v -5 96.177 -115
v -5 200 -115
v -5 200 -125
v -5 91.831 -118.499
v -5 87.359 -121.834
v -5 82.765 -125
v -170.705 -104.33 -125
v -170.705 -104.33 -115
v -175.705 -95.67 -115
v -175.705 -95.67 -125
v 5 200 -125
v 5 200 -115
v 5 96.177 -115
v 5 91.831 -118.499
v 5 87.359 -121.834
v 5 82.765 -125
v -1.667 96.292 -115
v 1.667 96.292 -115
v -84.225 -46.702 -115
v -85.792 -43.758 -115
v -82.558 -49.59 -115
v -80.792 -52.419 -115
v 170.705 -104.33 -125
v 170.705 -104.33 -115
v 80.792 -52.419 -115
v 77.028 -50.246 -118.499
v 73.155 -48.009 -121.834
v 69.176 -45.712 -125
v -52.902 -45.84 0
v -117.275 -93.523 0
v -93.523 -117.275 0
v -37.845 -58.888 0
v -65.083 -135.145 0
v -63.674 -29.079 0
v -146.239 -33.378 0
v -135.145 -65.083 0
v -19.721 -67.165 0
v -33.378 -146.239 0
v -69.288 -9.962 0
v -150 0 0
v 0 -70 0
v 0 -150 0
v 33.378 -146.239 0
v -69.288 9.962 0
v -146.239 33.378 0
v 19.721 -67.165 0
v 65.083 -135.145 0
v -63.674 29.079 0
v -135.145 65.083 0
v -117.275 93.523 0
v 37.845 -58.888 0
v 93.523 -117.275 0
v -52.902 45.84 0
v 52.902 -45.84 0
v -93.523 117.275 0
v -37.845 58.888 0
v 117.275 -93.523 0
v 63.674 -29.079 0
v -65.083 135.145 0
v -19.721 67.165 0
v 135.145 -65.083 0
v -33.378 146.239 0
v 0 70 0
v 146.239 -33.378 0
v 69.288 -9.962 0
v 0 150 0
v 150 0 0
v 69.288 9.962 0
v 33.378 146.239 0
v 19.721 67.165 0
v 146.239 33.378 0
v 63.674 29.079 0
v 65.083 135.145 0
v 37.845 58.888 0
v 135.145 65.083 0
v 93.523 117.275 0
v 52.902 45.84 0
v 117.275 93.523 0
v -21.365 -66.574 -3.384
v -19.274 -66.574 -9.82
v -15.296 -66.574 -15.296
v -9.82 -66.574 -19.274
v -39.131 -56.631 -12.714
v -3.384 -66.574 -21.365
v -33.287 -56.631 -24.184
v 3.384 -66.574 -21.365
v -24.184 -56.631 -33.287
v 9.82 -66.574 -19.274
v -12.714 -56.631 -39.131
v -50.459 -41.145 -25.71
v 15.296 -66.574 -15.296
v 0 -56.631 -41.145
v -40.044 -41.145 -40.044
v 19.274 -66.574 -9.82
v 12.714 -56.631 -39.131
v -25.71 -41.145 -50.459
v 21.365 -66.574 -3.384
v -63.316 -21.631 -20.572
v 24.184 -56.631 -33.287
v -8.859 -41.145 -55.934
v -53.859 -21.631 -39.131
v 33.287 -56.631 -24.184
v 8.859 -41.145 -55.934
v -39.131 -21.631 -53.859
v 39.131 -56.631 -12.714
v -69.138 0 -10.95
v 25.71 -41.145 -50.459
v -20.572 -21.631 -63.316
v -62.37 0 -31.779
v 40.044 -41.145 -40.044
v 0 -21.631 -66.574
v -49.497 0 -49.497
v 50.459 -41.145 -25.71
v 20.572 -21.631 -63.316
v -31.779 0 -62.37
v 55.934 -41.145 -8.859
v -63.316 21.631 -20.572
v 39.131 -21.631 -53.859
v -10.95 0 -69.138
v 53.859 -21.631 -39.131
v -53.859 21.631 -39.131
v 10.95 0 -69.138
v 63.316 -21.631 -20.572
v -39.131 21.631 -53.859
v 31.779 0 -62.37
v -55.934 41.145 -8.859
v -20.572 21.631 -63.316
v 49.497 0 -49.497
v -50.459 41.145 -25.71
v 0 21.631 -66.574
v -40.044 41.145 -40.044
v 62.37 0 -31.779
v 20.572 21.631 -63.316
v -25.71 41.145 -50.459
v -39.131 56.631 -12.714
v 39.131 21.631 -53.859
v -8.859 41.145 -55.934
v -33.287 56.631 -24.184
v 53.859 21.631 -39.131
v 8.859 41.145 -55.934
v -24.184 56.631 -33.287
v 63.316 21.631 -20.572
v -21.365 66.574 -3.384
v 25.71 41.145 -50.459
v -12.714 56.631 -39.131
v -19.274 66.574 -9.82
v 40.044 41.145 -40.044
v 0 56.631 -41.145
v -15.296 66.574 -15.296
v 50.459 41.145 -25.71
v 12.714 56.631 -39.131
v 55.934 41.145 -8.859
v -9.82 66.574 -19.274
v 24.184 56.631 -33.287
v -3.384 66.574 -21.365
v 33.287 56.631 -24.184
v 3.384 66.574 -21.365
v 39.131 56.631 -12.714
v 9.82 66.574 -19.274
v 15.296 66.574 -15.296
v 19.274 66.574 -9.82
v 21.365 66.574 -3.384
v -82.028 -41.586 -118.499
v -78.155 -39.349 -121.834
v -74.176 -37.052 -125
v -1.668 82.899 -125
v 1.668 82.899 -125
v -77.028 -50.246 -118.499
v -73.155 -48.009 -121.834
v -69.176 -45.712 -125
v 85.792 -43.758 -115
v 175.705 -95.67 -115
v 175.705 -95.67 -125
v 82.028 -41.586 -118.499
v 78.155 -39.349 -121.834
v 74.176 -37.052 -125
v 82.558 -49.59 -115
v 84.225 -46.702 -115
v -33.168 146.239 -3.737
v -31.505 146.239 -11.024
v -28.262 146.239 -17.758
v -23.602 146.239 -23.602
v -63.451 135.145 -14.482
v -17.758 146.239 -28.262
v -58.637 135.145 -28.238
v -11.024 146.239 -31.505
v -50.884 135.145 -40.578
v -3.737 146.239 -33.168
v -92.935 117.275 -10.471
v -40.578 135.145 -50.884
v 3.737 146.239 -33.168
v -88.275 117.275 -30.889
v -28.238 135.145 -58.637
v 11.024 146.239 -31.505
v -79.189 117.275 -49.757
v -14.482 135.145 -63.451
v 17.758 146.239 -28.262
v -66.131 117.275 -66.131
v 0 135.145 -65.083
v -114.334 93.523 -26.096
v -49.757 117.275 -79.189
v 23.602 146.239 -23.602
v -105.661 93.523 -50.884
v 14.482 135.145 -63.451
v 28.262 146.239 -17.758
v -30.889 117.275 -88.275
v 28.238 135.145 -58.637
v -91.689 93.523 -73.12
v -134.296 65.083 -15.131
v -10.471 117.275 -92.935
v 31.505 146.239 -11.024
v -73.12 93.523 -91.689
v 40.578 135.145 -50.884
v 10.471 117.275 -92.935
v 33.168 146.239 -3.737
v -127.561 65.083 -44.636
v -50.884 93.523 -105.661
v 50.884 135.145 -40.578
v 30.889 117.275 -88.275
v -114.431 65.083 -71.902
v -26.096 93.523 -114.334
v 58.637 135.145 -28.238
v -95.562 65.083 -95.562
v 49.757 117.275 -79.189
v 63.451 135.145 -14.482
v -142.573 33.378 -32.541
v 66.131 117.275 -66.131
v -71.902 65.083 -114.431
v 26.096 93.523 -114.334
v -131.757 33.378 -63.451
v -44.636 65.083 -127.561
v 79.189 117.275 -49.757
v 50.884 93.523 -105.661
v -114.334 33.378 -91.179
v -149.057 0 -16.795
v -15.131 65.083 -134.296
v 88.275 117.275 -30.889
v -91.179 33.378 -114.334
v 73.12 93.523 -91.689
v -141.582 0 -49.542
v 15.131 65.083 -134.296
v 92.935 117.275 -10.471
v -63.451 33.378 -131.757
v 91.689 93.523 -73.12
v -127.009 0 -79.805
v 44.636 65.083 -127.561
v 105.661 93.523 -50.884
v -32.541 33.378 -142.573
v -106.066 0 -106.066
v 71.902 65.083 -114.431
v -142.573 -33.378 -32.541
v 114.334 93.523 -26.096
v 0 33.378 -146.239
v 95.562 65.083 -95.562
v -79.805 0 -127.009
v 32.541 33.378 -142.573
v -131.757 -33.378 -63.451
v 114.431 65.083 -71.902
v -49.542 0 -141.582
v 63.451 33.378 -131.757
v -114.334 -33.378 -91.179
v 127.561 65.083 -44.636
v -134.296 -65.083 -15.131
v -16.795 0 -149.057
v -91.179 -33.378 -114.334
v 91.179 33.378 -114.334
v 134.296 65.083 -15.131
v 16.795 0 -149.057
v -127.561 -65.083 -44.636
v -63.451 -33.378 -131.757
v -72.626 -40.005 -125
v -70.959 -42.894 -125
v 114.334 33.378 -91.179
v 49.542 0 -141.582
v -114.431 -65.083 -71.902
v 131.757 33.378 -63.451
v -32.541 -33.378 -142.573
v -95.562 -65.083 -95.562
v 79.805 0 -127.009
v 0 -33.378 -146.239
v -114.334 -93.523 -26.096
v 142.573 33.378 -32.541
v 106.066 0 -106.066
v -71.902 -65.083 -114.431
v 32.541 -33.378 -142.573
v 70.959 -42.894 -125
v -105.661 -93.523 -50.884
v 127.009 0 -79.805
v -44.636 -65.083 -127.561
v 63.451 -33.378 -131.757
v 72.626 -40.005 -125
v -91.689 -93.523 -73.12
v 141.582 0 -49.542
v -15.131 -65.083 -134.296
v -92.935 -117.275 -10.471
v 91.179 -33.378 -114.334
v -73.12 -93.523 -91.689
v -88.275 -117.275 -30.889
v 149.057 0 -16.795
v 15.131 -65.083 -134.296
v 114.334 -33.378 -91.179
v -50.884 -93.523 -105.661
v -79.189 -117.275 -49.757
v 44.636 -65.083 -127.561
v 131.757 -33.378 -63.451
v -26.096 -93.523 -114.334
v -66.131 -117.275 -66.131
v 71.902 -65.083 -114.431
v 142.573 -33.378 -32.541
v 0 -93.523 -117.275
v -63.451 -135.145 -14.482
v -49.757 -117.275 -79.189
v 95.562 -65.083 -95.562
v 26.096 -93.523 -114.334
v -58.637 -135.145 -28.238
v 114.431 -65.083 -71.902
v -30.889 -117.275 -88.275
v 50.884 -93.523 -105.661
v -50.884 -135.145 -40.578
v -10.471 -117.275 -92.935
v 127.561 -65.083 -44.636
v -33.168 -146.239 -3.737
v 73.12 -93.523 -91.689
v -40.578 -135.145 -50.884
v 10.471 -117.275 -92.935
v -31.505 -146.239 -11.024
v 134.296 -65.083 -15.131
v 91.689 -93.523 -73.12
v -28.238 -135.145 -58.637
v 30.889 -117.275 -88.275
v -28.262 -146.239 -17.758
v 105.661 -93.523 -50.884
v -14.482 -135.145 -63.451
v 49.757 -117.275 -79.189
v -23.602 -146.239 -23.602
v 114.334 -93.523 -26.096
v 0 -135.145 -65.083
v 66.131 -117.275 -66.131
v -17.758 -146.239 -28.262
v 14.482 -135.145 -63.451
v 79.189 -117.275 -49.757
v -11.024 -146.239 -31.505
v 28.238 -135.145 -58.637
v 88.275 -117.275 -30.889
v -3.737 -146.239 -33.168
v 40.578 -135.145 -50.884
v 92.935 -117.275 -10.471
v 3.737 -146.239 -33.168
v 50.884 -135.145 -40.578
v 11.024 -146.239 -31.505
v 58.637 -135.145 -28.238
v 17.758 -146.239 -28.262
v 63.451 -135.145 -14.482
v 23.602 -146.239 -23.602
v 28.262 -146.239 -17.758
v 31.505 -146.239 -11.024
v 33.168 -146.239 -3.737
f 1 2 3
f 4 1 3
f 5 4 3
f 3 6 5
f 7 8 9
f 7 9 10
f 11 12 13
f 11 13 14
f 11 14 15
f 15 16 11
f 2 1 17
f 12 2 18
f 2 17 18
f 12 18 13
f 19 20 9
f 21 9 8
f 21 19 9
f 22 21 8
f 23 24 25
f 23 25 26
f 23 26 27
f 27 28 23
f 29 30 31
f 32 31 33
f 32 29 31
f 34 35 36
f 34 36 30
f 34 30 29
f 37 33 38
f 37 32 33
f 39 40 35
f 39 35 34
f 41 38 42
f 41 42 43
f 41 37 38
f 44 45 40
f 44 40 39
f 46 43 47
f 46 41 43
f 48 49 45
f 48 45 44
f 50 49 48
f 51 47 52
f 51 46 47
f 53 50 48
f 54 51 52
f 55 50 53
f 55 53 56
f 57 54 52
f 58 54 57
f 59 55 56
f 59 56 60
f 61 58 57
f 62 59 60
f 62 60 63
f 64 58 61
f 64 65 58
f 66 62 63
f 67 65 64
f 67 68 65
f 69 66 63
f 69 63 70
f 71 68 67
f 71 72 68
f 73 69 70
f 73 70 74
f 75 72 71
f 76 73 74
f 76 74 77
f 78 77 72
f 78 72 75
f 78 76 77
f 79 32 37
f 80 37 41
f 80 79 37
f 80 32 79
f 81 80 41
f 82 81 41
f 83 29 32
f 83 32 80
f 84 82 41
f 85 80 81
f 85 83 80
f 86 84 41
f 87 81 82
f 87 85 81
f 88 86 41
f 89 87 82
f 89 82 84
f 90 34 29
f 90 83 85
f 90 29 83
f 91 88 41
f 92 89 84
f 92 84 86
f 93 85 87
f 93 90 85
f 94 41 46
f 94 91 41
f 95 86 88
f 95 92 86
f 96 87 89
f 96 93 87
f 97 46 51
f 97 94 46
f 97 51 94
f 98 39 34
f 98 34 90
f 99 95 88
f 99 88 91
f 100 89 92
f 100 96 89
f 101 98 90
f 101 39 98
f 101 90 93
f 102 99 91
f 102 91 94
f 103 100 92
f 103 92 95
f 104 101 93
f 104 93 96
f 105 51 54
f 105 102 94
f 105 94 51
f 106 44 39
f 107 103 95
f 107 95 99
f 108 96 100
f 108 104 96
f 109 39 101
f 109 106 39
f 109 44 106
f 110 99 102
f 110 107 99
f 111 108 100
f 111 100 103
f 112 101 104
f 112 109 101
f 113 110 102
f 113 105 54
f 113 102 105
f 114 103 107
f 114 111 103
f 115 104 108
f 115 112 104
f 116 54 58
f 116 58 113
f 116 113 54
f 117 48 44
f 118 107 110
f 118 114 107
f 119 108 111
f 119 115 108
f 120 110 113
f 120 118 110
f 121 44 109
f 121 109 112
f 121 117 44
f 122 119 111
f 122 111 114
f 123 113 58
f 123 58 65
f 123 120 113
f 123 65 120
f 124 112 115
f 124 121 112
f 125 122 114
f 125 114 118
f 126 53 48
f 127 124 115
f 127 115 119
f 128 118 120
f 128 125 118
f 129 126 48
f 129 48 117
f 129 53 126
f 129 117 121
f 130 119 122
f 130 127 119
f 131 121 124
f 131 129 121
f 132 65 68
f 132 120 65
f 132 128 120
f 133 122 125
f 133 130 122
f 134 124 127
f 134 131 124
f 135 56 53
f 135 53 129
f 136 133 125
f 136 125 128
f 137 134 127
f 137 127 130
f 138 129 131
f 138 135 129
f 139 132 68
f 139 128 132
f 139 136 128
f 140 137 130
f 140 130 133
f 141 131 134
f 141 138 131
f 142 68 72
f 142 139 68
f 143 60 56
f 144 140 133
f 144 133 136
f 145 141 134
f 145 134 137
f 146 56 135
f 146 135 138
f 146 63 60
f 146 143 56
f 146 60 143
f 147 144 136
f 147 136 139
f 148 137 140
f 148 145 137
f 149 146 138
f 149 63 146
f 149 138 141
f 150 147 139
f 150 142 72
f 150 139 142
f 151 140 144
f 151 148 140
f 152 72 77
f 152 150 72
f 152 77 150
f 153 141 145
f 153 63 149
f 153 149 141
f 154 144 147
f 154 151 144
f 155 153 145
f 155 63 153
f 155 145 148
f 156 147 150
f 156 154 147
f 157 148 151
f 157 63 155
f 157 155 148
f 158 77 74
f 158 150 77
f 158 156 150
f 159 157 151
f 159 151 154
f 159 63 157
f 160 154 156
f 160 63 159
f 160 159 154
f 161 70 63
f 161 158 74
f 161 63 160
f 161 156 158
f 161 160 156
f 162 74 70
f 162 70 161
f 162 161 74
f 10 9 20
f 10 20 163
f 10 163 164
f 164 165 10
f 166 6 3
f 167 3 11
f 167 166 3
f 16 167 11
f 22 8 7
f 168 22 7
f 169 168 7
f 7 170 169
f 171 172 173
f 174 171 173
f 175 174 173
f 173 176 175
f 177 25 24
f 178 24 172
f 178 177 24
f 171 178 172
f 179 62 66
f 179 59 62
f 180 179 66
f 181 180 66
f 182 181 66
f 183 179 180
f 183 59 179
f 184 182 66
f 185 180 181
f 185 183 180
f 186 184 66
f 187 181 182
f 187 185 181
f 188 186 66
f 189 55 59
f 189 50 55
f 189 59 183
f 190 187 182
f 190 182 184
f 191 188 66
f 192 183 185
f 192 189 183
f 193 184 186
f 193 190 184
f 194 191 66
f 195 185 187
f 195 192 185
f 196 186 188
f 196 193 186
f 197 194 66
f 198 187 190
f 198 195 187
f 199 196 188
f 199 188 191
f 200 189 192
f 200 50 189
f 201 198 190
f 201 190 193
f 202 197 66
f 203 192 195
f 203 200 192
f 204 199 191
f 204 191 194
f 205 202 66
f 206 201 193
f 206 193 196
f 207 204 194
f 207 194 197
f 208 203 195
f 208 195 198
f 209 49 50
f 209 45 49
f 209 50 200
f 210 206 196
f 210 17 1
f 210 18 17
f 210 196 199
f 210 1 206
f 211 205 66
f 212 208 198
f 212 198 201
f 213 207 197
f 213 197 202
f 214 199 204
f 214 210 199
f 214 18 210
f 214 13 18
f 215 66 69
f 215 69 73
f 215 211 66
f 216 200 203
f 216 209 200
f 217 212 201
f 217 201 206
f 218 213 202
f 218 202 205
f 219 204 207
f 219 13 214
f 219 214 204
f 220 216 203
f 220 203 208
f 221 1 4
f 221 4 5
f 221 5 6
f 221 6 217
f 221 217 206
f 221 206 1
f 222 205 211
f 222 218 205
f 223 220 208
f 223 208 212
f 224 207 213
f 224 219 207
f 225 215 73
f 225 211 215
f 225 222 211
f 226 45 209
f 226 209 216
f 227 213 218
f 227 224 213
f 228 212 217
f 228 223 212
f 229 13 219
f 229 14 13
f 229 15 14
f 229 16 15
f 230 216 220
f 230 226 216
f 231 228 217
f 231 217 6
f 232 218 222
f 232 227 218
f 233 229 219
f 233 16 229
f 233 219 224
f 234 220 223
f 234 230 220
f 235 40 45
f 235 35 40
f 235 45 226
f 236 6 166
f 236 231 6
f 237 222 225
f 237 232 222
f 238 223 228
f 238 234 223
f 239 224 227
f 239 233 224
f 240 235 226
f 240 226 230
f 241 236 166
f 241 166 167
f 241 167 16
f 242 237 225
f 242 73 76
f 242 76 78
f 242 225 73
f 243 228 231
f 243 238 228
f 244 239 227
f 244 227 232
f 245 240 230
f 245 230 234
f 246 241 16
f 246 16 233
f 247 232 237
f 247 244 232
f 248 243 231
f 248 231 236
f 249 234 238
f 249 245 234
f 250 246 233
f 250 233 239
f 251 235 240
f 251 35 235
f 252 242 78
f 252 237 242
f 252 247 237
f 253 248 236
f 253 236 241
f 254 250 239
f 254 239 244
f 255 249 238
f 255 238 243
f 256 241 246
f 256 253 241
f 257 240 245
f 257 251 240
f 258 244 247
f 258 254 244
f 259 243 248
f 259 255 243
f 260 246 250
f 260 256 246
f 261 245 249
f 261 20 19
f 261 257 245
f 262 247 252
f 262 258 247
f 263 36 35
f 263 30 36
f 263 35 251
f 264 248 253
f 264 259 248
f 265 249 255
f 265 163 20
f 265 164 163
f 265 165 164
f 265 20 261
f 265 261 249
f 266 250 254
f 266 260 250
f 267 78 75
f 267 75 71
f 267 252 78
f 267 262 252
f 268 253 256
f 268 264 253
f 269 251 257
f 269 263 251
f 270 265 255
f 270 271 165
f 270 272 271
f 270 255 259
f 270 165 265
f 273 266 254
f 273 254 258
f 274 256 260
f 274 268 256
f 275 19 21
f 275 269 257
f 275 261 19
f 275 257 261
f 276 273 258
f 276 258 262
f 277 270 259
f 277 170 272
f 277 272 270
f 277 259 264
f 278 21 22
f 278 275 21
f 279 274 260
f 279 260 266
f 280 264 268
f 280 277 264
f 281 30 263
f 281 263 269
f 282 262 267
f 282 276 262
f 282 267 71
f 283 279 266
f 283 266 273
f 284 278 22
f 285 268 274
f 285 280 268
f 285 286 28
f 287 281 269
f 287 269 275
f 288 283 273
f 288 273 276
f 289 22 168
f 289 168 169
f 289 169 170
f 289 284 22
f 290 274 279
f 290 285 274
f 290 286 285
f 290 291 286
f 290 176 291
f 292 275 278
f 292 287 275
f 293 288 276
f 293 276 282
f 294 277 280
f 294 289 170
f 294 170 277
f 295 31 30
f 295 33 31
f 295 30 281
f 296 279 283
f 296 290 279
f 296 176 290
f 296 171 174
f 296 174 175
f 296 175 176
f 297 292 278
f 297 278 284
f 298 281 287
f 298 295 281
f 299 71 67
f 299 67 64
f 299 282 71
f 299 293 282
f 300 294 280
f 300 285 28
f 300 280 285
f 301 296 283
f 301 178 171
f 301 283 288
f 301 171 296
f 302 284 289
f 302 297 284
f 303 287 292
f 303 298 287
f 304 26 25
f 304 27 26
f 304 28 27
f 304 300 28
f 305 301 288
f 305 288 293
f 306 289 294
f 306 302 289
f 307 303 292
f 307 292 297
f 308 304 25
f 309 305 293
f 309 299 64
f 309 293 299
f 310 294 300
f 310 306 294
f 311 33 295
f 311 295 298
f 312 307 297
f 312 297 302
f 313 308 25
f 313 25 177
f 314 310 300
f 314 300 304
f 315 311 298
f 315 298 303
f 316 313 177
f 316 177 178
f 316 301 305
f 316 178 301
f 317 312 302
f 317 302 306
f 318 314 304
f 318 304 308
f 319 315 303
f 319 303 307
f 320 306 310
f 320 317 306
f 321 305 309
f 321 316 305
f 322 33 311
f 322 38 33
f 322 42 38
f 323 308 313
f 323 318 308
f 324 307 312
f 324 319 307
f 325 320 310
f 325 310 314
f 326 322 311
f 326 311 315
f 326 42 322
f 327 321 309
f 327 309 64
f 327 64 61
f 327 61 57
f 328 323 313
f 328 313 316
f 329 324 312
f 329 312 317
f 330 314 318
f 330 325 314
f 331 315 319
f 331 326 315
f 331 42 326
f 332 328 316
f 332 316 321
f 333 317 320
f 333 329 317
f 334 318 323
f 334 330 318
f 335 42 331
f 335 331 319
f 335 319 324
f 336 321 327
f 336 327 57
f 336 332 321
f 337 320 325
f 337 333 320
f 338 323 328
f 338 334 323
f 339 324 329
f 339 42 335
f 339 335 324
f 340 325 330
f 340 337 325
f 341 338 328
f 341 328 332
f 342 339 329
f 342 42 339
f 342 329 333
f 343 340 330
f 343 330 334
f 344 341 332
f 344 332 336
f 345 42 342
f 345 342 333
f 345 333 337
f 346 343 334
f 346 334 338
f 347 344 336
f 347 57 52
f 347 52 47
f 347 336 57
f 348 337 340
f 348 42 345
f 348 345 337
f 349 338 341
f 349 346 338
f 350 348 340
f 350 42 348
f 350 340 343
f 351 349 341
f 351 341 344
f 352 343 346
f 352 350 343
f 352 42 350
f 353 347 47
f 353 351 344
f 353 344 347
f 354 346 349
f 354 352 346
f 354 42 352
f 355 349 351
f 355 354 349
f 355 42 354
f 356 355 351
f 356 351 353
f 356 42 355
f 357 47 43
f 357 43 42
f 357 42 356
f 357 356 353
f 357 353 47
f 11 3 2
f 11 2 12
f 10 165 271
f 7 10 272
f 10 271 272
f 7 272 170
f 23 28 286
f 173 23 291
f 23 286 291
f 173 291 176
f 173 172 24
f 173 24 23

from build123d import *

# Parameters (mm, degrees)
REVOLVE_1_ANGLE = 180
SKETCH_2_W      = 10
SKETCH_2_H      = 10
EXTRUDE_1_DEPTH = 200
SKETCH_5_W      = 10
SKETCH_5_H      = 10
EXTRUDE_3_DEPTH = 200
SKETCH_6_W      = 10
SKETCH_6_H      = 10
EXTRUDE_4_DEPTH = 200


with BuildPart() as part:
    # ｽｹｯﾁ1 → 回転1 (revolve)
    with BuildSketch(Plane.XY):
        with BuildLine():
            Line((0, 70), (0, 150))
            ThreePointArc((0, 150), (-150, 0), (0, -150))
            Line((0, -150), (0, -70))
            ThreePointArc((0, -70), (-70, 0), (0, 70))
        make_face()
    revolve(axis=Axis((0, 150, 0), (0, -1, 0)), revolution_arc=REVOLVE_1_ANGLE)

    # ｽｹｯﾁ2 → ﾎﾞｽ - 押し出し1 (add)
    with BuildSketch(Plane(origin=(0, 0, 0), x_dir=(1, 0, 0), z_dir=(0, 1, 0))):
        with Locations((0, 120)):
            Rectangle(SKETCH_2_W, SKETCH_2_H)
    extrude(amount=EXTRUDE_1_DEPTH)

    # ｽｹｯﾁ5 → ﾎﾞｽ - 押し出し3 (add)
    with BuildSketch(Plane(origin=(0, 0, 0), x_dir=(0, 0, -1), z_dir=(0.8660254037844364, -0.5000000000000041, 0))):
        with Locations((120, 0)):
            Rectangle(SKETCH_5_W, SKETCH_5_H)
    extrude(amount=EXTRUDE_3_DEPTH)

    # ｽｹｯﾁ6 → ﾎﾞｽ - 押し出し4 (add)
    with BuildSketch(Plane(origin=(0, 0, 0), x_dir=(0, 0, -1), z_dir=(-0.8660254037844434, -0.49999999999999206, 0))):
        with Locations((120, 0)):
            Rectangle(SKETCH_6_W, SKETCH_6_H)
    extrude(amount=EXTRUDE_4_DEPTH)


solid = part.part
